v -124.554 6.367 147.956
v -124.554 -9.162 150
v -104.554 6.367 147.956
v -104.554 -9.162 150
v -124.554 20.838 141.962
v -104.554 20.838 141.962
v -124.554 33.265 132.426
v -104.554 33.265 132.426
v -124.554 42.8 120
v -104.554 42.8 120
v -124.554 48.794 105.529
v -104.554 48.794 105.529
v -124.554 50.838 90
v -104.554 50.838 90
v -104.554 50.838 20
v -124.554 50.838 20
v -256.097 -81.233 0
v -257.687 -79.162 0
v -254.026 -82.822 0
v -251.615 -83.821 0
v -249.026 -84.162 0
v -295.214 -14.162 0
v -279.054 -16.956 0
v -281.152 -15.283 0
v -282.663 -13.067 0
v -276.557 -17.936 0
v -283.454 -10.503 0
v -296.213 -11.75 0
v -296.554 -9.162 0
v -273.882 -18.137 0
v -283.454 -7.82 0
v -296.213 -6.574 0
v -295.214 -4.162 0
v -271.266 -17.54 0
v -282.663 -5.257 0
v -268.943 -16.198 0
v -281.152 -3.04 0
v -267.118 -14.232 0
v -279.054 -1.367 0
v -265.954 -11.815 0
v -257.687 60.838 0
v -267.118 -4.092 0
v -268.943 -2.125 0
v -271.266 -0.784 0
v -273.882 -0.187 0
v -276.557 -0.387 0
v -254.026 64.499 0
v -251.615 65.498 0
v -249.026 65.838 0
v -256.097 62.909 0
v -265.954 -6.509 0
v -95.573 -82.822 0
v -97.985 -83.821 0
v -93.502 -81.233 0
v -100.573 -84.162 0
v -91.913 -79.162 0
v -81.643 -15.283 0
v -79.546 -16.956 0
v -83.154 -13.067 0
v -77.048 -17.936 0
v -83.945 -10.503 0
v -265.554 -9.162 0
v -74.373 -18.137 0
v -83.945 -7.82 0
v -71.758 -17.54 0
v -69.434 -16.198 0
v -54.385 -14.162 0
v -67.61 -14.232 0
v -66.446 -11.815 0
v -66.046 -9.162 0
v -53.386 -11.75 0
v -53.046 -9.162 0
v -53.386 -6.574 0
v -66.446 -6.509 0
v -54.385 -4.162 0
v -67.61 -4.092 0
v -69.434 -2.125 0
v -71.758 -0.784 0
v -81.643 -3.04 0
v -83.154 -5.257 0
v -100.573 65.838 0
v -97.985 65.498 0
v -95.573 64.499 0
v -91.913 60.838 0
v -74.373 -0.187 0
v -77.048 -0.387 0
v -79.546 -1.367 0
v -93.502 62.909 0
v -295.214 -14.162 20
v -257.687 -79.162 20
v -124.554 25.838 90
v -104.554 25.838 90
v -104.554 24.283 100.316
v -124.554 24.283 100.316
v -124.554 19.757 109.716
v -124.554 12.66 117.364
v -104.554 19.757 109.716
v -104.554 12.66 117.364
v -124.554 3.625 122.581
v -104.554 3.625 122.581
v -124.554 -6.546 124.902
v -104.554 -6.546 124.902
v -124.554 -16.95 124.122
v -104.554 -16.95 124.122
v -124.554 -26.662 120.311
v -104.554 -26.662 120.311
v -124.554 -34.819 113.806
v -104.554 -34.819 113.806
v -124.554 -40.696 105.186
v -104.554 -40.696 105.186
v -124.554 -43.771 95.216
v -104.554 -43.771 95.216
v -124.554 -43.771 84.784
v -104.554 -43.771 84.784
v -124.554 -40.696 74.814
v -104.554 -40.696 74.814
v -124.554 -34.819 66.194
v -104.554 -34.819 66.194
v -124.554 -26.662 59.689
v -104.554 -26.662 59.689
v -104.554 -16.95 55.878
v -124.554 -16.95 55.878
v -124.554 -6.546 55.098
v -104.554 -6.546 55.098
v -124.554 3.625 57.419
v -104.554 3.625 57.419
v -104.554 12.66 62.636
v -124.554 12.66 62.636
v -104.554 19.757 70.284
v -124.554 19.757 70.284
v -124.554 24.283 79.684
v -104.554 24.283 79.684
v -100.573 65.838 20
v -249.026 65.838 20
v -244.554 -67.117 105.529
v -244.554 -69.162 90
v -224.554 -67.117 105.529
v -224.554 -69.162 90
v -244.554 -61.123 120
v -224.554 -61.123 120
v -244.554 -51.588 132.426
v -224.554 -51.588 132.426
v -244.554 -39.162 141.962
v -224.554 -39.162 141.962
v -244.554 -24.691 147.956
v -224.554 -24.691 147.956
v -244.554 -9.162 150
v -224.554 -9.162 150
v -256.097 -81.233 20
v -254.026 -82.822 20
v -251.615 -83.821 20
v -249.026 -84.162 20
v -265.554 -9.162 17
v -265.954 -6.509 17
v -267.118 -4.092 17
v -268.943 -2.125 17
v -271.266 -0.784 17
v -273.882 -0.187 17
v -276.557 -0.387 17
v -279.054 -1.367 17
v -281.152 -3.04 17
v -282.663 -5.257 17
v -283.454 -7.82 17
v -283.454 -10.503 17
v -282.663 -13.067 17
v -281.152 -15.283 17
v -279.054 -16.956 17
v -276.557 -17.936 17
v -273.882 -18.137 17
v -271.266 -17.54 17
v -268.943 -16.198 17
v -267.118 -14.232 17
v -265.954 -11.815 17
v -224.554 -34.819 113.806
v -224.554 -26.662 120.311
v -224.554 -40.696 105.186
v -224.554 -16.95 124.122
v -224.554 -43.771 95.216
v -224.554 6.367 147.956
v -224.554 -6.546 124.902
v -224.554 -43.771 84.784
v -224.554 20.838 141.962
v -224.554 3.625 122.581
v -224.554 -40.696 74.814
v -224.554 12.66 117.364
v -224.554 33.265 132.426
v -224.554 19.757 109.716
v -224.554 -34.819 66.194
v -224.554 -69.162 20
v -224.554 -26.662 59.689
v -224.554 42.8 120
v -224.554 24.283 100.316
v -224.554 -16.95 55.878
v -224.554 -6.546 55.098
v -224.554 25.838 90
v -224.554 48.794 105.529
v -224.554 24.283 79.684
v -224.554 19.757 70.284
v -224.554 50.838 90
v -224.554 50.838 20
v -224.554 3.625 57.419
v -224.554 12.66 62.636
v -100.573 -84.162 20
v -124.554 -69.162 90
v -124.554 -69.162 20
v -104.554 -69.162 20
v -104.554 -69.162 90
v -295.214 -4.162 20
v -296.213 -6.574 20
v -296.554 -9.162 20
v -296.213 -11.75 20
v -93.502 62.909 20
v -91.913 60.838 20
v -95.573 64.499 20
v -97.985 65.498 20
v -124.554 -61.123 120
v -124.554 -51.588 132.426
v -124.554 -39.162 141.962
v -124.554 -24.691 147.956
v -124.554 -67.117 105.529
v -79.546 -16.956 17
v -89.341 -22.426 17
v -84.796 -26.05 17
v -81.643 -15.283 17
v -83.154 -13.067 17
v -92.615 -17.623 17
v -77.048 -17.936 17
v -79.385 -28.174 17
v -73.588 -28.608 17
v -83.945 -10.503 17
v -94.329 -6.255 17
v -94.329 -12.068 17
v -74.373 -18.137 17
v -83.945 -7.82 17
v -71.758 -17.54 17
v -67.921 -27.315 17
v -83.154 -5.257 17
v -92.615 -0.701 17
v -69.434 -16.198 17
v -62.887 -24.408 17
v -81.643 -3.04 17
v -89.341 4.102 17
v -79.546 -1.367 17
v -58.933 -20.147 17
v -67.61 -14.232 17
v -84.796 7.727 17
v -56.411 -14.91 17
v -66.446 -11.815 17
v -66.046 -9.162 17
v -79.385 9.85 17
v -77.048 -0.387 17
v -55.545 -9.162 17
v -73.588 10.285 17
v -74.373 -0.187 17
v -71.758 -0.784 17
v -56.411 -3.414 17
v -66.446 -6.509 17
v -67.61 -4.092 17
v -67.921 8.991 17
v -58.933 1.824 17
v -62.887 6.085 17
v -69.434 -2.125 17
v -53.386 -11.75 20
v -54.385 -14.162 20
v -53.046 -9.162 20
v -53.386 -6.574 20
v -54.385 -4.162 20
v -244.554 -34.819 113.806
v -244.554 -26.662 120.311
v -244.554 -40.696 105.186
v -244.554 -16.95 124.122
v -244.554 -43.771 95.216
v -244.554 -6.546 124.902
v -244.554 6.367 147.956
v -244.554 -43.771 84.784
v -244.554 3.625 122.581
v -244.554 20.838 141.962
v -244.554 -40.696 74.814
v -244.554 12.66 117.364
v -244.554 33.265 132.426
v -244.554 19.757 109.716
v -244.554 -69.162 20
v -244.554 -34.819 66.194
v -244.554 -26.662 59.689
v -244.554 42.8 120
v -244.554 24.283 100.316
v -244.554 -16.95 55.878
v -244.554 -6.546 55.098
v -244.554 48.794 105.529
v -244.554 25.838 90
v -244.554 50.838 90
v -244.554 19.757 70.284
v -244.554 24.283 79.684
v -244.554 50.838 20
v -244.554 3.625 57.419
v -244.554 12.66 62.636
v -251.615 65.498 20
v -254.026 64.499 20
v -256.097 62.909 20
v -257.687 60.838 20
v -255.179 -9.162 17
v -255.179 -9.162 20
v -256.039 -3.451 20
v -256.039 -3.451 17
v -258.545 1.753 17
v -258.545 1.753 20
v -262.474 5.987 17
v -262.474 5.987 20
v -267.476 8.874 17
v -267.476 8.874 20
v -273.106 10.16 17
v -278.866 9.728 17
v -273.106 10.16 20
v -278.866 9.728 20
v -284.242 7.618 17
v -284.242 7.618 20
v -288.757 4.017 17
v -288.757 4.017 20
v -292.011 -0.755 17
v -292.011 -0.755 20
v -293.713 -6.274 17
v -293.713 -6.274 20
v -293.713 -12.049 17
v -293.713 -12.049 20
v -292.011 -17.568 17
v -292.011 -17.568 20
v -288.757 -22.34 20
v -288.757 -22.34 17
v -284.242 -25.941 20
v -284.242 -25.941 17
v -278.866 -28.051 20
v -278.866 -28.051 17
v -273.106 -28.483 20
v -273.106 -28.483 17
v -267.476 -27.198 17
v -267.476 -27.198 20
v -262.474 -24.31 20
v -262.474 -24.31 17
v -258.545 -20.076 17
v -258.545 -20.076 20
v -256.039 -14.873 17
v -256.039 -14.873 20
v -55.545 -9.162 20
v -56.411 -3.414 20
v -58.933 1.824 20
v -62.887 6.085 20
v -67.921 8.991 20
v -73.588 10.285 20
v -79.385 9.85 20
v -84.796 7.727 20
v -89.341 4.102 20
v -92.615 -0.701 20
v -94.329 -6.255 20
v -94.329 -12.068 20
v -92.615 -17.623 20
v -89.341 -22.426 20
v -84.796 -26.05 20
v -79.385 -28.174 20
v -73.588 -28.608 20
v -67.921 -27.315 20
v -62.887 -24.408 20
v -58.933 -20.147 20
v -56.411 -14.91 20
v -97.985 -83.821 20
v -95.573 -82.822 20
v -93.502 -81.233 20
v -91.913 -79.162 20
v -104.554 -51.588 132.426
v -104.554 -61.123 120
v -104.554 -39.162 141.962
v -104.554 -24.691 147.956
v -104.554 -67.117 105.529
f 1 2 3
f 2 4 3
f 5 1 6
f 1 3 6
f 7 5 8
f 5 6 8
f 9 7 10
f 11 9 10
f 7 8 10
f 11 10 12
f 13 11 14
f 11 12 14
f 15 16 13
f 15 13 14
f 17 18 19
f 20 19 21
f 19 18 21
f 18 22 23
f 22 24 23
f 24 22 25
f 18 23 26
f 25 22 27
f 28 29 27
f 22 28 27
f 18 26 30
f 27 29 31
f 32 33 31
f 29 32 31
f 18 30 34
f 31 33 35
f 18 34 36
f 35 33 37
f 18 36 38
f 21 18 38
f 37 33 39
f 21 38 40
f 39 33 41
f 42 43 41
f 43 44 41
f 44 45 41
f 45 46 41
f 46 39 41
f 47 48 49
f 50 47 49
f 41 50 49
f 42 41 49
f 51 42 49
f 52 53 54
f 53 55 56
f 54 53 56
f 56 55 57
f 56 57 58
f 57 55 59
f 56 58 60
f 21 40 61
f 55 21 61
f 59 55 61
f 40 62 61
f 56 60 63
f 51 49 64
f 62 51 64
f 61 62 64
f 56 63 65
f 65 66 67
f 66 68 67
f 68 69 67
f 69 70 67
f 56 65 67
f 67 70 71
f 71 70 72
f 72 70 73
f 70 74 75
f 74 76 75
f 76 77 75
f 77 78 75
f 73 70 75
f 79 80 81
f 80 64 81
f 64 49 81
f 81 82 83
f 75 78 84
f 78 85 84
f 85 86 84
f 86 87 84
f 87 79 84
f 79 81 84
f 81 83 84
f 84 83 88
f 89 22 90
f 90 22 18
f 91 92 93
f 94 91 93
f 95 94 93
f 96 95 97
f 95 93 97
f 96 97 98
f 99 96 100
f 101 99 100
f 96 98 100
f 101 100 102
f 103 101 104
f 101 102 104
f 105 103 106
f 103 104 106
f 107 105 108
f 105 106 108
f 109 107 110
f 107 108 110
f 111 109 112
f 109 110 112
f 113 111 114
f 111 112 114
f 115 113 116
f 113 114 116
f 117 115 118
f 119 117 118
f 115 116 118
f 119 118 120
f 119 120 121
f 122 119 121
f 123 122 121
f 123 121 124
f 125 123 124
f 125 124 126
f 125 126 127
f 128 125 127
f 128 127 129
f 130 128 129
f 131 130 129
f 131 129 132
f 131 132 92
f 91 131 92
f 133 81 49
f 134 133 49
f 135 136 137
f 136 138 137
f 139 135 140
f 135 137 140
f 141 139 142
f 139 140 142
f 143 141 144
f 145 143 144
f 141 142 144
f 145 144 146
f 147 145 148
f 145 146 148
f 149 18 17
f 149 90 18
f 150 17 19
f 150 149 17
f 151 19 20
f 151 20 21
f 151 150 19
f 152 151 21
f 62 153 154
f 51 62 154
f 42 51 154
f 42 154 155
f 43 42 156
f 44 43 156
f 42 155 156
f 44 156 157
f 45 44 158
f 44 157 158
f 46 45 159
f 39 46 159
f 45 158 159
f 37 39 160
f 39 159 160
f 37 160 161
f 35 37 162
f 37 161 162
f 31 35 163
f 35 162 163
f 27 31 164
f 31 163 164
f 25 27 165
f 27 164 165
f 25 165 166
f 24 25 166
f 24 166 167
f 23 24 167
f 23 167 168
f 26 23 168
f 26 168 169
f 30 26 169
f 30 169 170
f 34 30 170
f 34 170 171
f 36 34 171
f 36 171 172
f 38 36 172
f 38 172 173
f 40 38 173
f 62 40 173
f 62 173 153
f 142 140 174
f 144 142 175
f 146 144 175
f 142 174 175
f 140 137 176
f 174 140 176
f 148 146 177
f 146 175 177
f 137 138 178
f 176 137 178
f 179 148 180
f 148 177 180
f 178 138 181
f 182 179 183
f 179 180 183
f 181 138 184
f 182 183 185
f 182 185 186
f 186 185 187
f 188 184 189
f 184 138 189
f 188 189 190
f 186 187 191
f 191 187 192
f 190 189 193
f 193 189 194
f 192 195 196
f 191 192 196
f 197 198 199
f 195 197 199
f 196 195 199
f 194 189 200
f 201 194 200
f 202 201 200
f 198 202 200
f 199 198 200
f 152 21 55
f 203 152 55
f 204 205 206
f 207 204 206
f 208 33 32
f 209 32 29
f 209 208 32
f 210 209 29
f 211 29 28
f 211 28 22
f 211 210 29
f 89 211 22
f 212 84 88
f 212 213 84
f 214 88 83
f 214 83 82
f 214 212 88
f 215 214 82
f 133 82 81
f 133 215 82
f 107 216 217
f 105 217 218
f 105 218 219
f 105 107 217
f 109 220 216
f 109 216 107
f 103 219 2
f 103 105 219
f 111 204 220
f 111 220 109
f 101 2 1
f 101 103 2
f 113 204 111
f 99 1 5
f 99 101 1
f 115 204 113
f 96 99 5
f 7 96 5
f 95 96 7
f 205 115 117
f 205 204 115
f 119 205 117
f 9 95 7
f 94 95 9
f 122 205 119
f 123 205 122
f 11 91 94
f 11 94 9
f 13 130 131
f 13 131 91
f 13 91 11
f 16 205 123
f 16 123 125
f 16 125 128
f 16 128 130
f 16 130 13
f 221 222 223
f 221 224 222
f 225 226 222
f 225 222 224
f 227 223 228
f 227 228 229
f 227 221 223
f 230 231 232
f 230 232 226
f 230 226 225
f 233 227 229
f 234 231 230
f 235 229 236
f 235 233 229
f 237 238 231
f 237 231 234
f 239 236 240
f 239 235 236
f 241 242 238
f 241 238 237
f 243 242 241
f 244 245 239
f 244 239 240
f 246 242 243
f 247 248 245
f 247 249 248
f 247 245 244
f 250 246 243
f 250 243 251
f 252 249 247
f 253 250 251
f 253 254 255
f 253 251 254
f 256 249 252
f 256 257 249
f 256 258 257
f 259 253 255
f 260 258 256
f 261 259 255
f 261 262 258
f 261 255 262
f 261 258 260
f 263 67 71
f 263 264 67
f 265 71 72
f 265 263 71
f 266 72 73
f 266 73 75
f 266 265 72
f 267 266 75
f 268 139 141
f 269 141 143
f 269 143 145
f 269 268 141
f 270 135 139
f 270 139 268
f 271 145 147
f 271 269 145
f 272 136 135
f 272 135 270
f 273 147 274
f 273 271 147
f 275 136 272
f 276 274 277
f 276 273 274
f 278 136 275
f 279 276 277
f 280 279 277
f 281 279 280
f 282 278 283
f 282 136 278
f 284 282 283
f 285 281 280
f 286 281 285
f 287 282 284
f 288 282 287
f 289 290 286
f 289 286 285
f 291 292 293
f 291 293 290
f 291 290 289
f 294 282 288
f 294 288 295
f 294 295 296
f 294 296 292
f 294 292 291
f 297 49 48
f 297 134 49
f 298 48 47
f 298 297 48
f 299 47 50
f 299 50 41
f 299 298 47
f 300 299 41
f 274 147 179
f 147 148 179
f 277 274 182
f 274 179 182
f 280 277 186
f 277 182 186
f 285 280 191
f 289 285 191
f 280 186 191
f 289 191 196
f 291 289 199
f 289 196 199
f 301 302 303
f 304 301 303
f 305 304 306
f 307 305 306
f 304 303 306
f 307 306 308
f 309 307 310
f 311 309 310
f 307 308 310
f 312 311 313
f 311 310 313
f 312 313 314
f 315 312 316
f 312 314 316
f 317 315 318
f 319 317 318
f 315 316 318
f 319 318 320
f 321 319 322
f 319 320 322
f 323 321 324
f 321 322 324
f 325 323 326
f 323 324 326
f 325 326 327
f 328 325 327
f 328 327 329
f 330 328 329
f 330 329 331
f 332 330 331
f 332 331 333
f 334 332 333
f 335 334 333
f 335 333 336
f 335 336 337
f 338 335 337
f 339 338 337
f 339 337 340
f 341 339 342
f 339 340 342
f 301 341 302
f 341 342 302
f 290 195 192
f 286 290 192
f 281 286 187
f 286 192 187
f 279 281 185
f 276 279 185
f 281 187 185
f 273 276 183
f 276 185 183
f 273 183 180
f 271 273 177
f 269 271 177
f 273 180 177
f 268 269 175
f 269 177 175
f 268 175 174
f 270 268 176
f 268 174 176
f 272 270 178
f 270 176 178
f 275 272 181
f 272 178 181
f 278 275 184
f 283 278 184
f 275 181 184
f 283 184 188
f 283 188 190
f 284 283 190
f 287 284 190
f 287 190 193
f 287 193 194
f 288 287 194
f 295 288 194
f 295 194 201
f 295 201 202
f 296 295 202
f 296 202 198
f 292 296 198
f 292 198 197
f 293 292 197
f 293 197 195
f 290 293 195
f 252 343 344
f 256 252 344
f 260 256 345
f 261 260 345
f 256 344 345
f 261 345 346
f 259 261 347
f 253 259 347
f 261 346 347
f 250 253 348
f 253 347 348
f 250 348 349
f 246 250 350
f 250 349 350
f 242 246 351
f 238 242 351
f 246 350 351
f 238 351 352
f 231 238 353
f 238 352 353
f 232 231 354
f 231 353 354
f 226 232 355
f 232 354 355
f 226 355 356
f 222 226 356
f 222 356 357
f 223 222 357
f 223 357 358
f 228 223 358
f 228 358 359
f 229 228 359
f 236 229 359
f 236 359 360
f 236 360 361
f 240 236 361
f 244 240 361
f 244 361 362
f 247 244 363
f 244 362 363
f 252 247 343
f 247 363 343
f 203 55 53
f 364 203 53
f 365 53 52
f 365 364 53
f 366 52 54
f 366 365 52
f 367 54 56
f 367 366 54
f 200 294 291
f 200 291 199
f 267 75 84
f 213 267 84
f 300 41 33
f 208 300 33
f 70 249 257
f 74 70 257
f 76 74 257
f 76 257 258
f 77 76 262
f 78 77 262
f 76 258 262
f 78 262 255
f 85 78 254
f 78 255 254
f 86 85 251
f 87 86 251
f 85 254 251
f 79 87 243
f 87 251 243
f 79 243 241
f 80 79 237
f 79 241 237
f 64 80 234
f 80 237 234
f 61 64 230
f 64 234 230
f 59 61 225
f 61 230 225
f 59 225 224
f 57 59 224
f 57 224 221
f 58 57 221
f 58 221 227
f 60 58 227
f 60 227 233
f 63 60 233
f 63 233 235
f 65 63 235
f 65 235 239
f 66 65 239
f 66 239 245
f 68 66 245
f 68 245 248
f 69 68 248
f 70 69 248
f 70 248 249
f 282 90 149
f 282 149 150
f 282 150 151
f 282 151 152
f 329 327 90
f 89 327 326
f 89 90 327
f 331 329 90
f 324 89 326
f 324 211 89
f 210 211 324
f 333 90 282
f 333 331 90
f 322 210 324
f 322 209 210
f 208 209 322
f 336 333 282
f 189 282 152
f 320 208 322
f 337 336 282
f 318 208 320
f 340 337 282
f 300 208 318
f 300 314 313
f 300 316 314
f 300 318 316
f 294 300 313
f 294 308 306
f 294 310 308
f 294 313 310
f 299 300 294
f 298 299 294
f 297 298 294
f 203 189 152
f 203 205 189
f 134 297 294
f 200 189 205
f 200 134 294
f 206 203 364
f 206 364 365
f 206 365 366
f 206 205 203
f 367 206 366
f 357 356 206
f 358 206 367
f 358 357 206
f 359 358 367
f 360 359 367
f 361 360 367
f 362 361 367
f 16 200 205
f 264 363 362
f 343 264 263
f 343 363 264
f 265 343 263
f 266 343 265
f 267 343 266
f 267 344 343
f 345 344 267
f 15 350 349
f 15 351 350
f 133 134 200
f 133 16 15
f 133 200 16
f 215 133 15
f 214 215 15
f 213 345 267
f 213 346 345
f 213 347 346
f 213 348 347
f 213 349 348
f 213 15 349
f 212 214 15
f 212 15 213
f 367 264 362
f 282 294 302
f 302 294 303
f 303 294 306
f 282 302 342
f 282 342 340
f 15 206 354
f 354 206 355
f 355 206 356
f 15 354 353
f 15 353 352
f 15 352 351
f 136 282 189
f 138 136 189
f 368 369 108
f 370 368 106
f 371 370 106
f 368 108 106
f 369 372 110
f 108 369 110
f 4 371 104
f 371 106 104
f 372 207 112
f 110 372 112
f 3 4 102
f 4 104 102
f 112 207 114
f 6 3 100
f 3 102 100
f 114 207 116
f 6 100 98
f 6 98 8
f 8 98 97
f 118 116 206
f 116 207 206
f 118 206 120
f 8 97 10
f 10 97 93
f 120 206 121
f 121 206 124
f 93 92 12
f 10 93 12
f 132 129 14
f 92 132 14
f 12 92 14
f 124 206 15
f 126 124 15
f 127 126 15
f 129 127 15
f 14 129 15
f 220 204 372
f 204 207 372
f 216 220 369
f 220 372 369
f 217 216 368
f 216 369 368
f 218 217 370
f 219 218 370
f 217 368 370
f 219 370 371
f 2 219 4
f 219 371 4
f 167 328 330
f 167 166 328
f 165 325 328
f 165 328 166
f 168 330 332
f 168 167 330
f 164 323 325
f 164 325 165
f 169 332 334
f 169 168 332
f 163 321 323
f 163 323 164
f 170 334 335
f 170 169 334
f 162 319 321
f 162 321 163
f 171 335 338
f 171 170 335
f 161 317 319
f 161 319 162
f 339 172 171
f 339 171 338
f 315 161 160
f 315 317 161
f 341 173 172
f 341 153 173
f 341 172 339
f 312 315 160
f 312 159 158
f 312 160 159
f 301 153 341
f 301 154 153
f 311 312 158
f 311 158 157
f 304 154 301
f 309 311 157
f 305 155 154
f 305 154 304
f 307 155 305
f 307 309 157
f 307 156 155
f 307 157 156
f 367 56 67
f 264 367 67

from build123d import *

# Parameters (mm, degrees)
BOSS_EXTRU_1_DEPTH      = 20
CONG_1_R                = 10
CONG_2_R                = 10
CONG_3_R                = 10
CONG_4_R                = 10
CONG_5_R                = 10
CONG_7_R                = 10
ESQUISSE2_W             = 20
ESQUISSE2_H             = 120
BOSS_EXTRU_2_DEPTH      = 130
CONG_8_R                = 60
CONG_9_R                = 60
CONG_10_R               = 60
CONG_11_R               = 60
ESQUISSE3_R             = 35
ENL_V_MAT_EXTRU_1_DEPTH = 258.77353424
ESQUISSE4_R             = 9
ENL_V_MAT_EXTRU_2_DEPTH = 335.555805948
ESQUISSE5_R             = 19.375511008
ESQUISSE5_R_2           = 19.500884668
ENL_V_MAT_EXTRU_3_DEPTH = 3


with BuildPart() as part:
    # Esquisse1 → Boss.-Extru.1 (new body)
    with BuildSketch(Plane.XY):
        Polygon((-254.799934421, 65.838280942), (-298.101203362, -9.161719058), (-254.799931925, -84.161719058), (-94.799931925, -84.161719058), (-51.498662984, -9.161719058), (-94.799934421, 65.838280942), align=None)
    extrude(amount=BOSS_EXTRU_1_DEPTH)

    # Congé1
    cong_1_edges = [part.edges().sort_by_distance(p)[0] for p in [
        (-94.799934421, 65.838280942, 10),
    ]]
    fillet(cong_1_edges, radius=CONG_1_R)

    # Congé2
    cong_2_edges = [part.edges().sort_by_distance(p)[0] for p in [
        (-254.799934421, 65.838280942, 10),
    ]]
    fillet(cong_2_edges, radius=CONG_2_R)

    # Congé3
    cong_3_edges = [part.edges().sort_by_distance(p)[0] for p in [
        (-298.101203362, -9.161719058, 10),
    ]]
    fillet(cong_3_edges, radius=CONG_3_R)

    # Congé4
    cong_4_edges = [part.edges().sort_by_distance(p)[0] for p in [
        (-254.799931925, -84.161719058, 10),
    ]]
    fillet(cong_4_edges, radius=CONG_4_R)

    # Congé5
    cong_5_edges = [part.edges().sort_by_distance(p)[0] for p in [
        (-94.799931925, -84.161719058, 10),
    ]]
    fillet(cong_5_edges, radius=CONG_5_R)

    # Congé7
    cong_7_edges = [part.edges().sort_by_distance(p)[0] for p in [
        (-51.498662984, -9.161719058, 10),
    ]]
    fillet(cong_7_edges, radius=CONG_7_R)

    # Esquisse2 → Boss.-Extru.2 (add)
    with BuildSketch(Plane.XY.offset(20)):
        with Locations((-234.554197979, -9.161719058)):
            Rectangle(ESQUISSE2_W, ESQUISSE2_H)
        with Locations((-114.554197979, -9.161719058)):
            Rectangle(ESQUISSE2_W, ESQUISSE2_H)
    extrude(amount=BOSS_EXTRU_2_DEPTH)

    # Congé8
    cong_8_edges = [part.edges().sort_by_distance(p)[0] for p in [
        (-114.554197979, -69.161719058, 150),
    ]]
    fillet(cong_8_edges, radius=CONG_8_R)

    # Congé9
    cong_9_edges = [part.edges().sort_by_distance(p)[0] for p in [
        (-114.554197979, 50.838280942, 150),
    ]]
    fillet(cong_9_edges, radius=CONG_9_R - 0.0001)  # a hair under: the kernel refuses the full size

    # Congé10
    cong_10_edges = [part.edges().sort_by_distance(p)[0] for p in [
        (-234.554197979, -69.161719058, 150),
    ]]
    fillet(cong_10_edges, radius=CONG_10_R)

    # Congé11
    cong_11_edges = [part.edges().sort_by_distance(p)[0] for p in [
        (-234.554197979, 50.838280942, 150),
    ]]
    fillet(cong_11_edges, radius=CONG_11_R - 0.0001)  # a hair under: the kernel refuses the full size

    # Esquisse3 → Enlèv. mat.-Extru.1 (cut, through all)
    with BuildSketch(Plane(origin=(-104.554197979, 0, 0), x_dir=(0, 0, -1), z_dir=(1, 0, 0))):
        with Locations(Location((-90, -9.161719058, 0), (0, 0, 90))):
            Circle(ESQUISSE3_R)
    extrude(amount=-ENL_V_MAT_EXTRU_1_DEPTH, mode=Mode.SUBTRACT)

    # Esquisse4 → Enlèv. mat.-Extru.2 (cut, through all)
    with BuildSketch(Plane.XY.offset(20)):
        with Locations((-274.554197979, -9.161719058)):
            Circle(ESQUISSE4_R)
        with Locations((-75.045668368, -9.161719084)):
            Circle(ESQUISSE4_R)
    extrude(amount=-ENL_V_MAT_EXTRU_2_DEPTH, mode=Mode.SUBTRACT)

    # Esquisse5 → Enlèv. mat.-Extru.3 (cut)
    with BuildSketch(Plane.XY.offset(20)):
        with Locations((-274.554197979, -9.161719058)):
            Circle(ESQUISSE5_R)
        with Locations((-75.045668368, -9.161719084)):
            Circle(ESQUISSE5_R_2)
    extrude(amount=-ENL_V_MAT_EXTRU_3_DEPTH, mode=Mode.SUBTRACT)


solid = part.part
